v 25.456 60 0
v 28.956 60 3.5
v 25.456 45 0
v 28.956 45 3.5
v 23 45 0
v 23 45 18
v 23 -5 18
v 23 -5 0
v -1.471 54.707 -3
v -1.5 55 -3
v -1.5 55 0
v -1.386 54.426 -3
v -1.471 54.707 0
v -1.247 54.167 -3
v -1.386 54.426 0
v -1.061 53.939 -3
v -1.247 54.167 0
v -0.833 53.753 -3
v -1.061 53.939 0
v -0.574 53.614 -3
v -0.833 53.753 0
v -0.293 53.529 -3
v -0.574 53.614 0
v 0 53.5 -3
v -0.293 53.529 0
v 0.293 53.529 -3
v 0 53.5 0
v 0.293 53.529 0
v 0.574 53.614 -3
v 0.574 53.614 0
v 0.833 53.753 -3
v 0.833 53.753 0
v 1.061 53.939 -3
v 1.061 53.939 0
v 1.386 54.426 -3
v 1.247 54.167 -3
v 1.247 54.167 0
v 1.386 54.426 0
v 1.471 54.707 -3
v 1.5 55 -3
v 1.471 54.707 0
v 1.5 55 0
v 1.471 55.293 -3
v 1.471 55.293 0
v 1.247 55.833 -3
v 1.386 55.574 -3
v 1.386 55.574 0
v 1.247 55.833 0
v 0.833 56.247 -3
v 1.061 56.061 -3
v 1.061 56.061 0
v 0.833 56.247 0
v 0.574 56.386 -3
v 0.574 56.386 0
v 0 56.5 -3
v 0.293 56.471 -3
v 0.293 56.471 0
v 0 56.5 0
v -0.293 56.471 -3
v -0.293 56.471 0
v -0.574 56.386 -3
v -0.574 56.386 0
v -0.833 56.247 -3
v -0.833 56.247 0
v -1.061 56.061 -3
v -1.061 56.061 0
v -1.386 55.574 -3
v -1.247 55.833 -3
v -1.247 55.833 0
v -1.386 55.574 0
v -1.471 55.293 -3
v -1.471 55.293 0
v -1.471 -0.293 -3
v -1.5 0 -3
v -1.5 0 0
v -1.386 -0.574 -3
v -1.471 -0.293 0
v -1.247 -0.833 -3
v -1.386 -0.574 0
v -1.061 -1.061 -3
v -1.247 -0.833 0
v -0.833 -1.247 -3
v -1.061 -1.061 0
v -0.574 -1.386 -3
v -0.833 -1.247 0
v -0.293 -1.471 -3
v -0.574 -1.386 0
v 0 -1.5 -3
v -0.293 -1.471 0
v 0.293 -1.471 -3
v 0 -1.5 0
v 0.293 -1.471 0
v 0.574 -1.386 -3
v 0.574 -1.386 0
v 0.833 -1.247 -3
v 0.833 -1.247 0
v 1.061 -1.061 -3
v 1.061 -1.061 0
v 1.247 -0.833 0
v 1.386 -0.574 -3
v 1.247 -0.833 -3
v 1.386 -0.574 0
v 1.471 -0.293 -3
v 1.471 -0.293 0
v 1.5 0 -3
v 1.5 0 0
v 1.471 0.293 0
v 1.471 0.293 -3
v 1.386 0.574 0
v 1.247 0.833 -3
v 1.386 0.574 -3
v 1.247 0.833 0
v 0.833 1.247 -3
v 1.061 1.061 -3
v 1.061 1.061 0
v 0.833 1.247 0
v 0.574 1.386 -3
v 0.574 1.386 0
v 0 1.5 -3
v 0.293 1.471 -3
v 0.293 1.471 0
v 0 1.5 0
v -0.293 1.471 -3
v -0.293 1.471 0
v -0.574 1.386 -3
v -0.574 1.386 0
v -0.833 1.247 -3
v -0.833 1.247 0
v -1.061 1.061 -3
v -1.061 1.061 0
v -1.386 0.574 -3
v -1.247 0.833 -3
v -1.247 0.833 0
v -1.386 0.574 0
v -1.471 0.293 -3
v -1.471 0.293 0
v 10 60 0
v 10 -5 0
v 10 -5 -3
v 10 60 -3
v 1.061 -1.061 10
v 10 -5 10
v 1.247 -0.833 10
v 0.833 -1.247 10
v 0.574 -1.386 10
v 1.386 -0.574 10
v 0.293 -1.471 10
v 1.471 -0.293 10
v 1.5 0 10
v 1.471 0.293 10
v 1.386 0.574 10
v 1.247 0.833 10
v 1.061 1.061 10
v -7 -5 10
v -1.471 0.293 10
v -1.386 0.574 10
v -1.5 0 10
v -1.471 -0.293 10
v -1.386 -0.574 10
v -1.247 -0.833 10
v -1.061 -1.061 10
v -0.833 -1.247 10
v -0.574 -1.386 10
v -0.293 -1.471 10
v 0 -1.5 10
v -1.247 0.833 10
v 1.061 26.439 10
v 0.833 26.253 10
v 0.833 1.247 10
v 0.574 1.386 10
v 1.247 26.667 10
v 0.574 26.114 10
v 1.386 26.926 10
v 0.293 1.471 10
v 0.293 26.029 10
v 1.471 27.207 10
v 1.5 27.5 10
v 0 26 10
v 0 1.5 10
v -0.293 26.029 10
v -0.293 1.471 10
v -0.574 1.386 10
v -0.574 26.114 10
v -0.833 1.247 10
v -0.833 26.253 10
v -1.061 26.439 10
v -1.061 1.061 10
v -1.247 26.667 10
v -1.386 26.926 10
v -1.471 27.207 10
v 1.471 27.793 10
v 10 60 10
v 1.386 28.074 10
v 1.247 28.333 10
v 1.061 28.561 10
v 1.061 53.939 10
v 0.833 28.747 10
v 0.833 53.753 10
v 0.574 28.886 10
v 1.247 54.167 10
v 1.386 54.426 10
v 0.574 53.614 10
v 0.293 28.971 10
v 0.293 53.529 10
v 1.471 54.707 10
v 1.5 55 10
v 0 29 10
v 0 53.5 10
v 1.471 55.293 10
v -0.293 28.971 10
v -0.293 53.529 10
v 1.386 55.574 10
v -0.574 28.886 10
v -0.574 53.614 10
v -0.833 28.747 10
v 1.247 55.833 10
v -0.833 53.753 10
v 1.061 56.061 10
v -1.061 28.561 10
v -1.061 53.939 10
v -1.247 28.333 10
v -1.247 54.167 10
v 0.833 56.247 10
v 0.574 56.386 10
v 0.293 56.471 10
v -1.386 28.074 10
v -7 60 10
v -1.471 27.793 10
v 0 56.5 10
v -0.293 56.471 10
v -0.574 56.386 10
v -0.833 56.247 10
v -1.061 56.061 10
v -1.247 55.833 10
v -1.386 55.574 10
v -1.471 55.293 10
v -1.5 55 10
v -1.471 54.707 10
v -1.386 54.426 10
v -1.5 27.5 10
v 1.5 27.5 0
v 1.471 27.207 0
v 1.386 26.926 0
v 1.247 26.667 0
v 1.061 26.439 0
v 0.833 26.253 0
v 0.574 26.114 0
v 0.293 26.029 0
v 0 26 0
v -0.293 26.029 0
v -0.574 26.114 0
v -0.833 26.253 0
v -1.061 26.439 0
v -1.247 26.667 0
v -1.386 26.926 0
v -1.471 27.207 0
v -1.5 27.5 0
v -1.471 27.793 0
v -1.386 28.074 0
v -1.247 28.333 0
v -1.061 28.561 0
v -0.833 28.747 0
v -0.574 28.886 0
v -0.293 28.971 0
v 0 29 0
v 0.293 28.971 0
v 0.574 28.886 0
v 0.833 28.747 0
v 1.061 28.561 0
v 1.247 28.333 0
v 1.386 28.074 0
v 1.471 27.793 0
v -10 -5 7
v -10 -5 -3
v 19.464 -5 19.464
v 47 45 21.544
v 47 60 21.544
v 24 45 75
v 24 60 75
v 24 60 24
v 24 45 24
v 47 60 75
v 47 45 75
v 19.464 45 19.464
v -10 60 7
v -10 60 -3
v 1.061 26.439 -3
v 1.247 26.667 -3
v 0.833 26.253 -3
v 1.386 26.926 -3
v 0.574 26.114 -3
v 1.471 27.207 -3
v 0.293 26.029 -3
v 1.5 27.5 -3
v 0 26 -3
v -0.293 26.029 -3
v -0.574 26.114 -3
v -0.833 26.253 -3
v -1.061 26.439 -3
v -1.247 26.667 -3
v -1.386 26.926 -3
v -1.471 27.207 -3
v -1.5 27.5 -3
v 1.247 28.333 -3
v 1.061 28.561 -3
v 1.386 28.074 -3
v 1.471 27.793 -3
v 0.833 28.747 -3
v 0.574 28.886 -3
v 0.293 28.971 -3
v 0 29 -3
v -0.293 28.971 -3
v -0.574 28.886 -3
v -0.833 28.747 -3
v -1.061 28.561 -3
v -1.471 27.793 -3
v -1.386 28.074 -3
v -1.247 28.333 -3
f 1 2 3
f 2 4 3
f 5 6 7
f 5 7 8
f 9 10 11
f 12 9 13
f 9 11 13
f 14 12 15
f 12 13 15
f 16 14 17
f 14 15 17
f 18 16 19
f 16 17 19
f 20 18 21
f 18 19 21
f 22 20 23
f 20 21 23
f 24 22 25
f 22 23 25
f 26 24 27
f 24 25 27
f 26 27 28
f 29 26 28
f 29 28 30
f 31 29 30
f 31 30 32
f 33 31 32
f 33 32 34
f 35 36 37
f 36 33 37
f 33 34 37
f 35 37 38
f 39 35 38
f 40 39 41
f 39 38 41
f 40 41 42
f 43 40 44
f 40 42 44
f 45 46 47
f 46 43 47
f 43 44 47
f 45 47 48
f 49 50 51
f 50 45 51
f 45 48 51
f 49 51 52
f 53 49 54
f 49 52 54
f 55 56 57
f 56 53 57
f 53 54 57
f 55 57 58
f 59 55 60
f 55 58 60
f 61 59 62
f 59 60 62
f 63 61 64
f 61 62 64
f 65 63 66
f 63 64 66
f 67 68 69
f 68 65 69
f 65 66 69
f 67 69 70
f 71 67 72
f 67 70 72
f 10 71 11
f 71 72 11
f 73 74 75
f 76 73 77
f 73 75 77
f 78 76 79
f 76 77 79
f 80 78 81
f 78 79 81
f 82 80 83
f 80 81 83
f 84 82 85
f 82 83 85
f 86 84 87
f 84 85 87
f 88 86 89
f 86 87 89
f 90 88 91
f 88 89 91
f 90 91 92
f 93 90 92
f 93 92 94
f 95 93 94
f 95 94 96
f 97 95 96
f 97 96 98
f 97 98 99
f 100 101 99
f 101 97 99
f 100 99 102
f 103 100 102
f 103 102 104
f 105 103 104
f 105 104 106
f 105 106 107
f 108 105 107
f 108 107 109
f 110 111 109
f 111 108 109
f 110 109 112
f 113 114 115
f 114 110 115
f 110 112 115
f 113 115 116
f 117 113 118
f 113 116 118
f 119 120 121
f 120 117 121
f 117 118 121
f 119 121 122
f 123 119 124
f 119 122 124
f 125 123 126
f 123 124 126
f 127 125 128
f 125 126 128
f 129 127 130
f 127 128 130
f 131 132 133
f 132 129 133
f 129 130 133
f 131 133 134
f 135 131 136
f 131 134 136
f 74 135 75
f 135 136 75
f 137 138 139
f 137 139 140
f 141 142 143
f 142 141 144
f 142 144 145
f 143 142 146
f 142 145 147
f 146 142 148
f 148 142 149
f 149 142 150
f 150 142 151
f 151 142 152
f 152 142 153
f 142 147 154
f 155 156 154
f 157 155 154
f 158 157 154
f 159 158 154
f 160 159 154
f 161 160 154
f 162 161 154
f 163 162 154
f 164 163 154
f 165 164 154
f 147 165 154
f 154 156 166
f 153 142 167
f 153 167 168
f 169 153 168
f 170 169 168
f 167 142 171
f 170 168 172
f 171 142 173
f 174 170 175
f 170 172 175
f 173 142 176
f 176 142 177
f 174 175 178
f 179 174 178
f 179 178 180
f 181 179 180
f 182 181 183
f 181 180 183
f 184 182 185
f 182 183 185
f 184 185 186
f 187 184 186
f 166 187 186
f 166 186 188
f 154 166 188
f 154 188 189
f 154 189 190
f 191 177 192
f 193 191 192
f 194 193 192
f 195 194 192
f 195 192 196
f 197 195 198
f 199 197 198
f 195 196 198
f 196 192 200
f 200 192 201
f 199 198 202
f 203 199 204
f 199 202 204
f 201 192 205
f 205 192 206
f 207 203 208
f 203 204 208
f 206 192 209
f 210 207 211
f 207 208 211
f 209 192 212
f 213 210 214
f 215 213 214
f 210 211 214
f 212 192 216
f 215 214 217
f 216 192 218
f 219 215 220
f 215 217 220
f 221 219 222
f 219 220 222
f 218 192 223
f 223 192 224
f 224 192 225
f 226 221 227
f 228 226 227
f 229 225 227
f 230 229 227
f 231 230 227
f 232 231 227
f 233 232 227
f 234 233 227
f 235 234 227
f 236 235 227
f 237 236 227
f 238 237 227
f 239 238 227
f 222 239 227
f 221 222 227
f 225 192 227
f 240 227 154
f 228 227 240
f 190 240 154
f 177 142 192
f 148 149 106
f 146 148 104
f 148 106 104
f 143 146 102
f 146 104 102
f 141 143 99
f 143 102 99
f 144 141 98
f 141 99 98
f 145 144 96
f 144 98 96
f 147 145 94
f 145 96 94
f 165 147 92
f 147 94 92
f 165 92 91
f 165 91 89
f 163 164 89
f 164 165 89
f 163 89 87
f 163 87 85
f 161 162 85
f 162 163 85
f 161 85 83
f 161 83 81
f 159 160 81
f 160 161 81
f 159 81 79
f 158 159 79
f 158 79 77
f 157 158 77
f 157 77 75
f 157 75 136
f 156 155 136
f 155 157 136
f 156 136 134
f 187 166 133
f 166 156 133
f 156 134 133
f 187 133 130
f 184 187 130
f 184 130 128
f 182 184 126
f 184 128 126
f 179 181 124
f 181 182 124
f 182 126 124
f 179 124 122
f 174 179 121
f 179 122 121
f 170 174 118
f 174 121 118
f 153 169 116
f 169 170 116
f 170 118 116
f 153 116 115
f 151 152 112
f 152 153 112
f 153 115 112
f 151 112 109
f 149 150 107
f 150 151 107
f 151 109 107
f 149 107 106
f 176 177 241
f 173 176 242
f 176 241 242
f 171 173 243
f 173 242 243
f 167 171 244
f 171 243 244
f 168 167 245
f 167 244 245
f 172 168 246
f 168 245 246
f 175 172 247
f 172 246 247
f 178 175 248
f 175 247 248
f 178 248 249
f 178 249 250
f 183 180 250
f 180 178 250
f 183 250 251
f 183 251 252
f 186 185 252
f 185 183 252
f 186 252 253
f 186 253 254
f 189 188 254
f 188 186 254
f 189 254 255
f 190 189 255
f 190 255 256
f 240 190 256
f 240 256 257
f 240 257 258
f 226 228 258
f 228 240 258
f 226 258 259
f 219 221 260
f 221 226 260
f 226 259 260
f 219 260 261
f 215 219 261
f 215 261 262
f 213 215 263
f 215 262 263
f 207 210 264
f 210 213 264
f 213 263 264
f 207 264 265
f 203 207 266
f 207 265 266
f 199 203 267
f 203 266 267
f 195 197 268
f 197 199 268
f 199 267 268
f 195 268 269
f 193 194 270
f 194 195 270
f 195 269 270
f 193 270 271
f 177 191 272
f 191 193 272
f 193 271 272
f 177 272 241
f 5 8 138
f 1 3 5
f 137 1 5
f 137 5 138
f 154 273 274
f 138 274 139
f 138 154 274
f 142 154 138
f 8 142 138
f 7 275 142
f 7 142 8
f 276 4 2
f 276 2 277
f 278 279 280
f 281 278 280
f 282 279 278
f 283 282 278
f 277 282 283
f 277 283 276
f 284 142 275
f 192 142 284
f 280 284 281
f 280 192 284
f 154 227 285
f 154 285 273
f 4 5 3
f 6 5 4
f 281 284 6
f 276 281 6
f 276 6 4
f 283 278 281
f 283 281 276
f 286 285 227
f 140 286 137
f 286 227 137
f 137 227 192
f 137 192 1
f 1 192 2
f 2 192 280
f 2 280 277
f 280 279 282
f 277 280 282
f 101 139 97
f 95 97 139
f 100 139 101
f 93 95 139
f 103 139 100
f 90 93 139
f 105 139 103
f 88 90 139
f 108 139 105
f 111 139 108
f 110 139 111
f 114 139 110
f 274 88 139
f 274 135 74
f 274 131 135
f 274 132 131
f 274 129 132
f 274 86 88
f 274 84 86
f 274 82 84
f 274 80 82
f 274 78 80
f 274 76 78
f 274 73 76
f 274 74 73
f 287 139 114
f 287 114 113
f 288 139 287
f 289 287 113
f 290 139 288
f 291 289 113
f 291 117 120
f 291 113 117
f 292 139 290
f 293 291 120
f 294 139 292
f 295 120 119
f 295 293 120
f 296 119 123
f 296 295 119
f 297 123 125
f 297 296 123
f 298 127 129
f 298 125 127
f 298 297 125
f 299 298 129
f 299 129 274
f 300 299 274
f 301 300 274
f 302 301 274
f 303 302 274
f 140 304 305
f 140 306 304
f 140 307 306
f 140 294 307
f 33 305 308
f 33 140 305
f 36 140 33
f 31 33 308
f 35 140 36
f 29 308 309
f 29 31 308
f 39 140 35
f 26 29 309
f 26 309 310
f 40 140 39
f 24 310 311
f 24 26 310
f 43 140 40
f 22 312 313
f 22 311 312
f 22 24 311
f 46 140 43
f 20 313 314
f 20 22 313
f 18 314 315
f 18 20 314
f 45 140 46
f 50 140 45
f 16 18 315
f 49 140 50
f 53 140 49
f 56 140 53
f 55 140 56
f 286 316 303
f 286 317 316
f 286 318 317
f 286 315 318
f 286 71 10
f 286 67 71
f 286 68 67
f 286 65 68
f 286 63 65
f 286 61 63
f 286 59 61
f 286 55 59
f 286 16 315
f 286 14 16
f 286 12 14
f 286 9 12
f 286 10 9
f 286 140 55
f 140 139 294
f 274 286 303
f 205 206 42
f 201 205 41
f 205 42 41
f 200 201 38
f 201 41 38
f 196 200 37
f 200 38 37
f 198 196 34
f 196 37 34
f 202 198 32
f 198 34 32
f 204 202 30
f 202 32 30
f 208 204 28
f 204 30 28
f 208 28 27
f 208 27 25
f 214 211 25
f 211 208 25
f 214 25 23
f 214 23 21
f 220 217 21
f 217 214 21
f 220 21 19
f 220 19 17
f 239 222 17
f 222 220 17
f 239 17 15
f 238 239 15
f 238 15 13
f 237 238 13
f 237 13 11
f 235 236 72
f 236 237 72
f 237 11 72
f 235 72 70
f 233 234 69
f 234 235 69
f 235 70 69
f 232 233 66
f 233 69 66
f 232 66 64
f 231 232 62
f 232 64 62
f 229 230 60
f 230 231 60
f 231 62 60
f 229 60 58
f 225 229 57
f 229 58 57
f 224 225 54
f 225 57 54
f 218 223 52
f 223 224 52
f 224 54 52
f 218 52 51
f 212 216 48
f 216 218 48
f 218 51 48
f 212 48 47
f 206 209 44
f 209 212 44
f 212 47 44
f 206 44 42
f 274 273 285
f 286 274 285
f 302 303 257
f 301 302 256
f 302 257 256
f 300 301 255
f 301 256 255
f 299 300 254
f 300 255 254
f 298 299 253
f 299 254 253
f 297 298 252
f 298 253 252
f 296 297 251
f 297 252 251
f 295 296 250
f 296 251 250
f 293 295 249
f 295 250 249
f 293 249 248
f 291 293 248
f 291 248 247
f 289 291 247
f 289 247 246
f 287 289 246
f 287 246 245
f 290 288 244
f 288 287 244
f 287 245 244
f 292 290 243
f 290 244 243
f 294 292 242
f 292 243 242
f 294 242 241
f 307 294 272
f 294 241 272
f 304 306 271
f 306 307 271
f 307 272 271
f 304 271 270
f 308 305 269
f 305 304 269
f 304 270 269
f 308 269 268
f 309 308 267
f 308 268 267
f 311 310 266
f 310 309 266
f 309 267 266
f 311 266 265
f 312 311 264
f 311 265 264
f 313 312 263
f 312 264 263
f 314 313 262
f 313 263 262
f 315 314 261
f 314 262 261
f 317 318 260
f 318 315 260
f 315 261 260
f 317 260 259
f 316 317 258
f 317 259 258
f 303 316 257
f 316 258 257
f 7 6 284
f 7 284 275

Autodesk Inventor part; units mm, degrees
ref_plane "YZ Plane" through (0, 0, 0) normal (1, 0, 0) x (0, 1, 0)
ref_plane "XZ Plane" through (0, 0, 0) normal (0, 1, 0) x (-1, 0, 0)
ref_plane "XY Plane" through (0, 0, 0) normal (0, 0, 1) x (1, 0, 0)
sketch "Sketch9" plane through (0, 0, 0) normal (0, 0, 1) x (1, 0, 0)
  line L0 (0, 0) -> (0, 55) construction
  circle A0 centre (0, 55) radius 1.5
  circle A1 centre (0, 0) radius 1.5
  circle A2 centre (0, 27.5) radius 1.5
  line L1 (-10, 60) -> (10, 60)
  line L2 (10, 60) -> (10, -5)
  line L3 (10, -5) -> (-10, -5)
  line L4 (-10, -5) -> (-10, 60)
  point P0 (-10, 27.5)
  point P1 (0, 60)
  dimension "d35" = 55
  dimension "d36" = 3
  dimension "d37" = 3
  dimension "d38" = 3
  dimension "d39" = 5
  dimension "d40" = 10
extrude "Extrusion9" add sketch "Sketch9" along normal blind 10
sketch "Sketch11" plane through (10, -5, 0) normal (1, 0, 0) x (0, 0, -1)
  line L0 (0, 65) -> (-10, 65) projected
  line L1 (0, 65) -> (-75, 65)
  line L2 (-75, 65) -> (-75, 50)
  line L3 (-75, 50) -> (0, 50)
  line L4 (0, 50) -> (0, 65)
  point P0 (0, 5)
  dimension "d43" = 15
  dimension "d44" = 75
extrude "Extrusion10" add sketch "Sketch11" along normal blind 37
sketch "Sketch12" plane through (-10, 60, 10) normal (0, 1, 0) x (1, 0, 0)
  line L0 (20, -65) -> (20, 0) projected
  line L1 (20, -65) -> (34, -65)
  line L2 (34, -65) -> (34, 0)
  line L3 (34, 0) -> (20, 0)
  line L4 (20, 0) -> (20, -65)
  point P0 (10, 10)
  dimension "d47" = 14
extrude "Extrusion11" cut sketch "Sketch12" against normal through all
chamfer "Chamfer6" distance 14 angle 45 1 edges at (24, 52.5, 10)
sketch "Sketch14" plane through (10, 45, 0) normal (0, -1, 0) x (1, 0, 0)
  line L0 (0, 10) -> (14, 24) projected
  line L1 (15.4558, 0) -> (37, 21.5442)
  line L2 (37, 75) -> (37, 0) projected
  line L3 (0, 0) -> (37, 0) projected
  line L4 (15.4558, 0) -> (37, 0)
  line L5 (37, 21.5442) -> (37, 0)
  point P0 (-10, 0)
  dimension "d73" = 18
extrude "Extrusion13" cut sketch "Sketch14" against normal through all
sketch "Sketch15" plane through (0, 0, 0) normal (0, 0, -1) x (-1, 0, 0)
  line L0 (-25.4558, 60) -> (-25.4558, 45) projected
  line L1 (-10, 45) -> (-25.4558, 45) projected
  line L2 (-10, 45) -> (-10, -5) projected
  line L3 (-10, -5) -> (10, -5) projected
  line L4 (10, -5) -> (10, 60) projected
  line L5 (10, 60) -> (-25.4558, 60) projected
  circle A0 centre (0, 55) radius 1.5 projected
  circle A1 centre (0, 0) radius 1.5 projected
  circle A2 centre (0, 27.5) radius 1.5 projected
  line L6 (-10, -5) -> (10, -5) projected
  line L7 (10, 60) -> (-10, 60) projected
  line L8 (-10, -5) -> (-10, 60)
  line L9 (-10, 60) -> (10, 60)
extrude "Extrusion14" add sketch "Sketch15" along normal blind 3 contours L5 L4 L3 L2 L8
chamfer "Chamfer8" distance 3 angle 45 1 edges at (-10, 27.5, 10)
sketch "Sketch17" plane through (-10, -5, -3) normal (0, -1, 0) x (1, 0, 0)
  line L0 (20, 3) -> (20, 13) projected
  line L1 (20, 3) -> (35.4558, 3) projected
  line L2 (20, 3) -> (35.4558, 3)
  line L3 (35.4558, 3) -> (37.5981, 4.5)
  line L4 (37.5981, 4.5) -> (51, 4.5)
  line L5 (51, 6.5) -> (36.9675, 6.5)
  line L6 (36.9675, 6.5) -> (34.8252, 5)
  line L7 (34.8252, 5) -> (20, 5)
  line L8 (20, 3) -> (20, 5)
  line L9 (51, 6.5) -> (51, 4.5)
  point P0 (10, 3)
  point P1 (57, 24.5442)
  dimension "d83" = 215
  dimension "d84" = 2
  dimension "d88" = 1.5
  dimension "d89" = 6
extrude "Extrusion16" add sketch "Sketch17" against normal blind 65
sketch "Sketch18" plane through (24, 60, 75) normal (0, 1, 0) x (1, 0, 0)
  line L0 (17, 73.5) -> (3.5981, 73.5) projected
  line L1 (4.9558, 71.5) -> (17, 71.5) projected
  line L2 (17, 71.5) -> (17, 73.5) projected
  line L3 (3.5981, 73.5) -> (4.9558, 71.5)
  point P0 (-24, 75)
extrude "Extrusion17" cut sketch "Sketch18" against normal through all
sketch "Sketch19" plane through (-10, -5, -3) normal (0, -1, 0) x (1, 0, 0)
  line L0 (34.8252, 5) -> (20, 5) projected
  line L1 (20, 3) -> (35.4558, 3) projected
  line L2 (35.4558, 3) -> (37.5981, 4.5) projected
  line L3 (37.5981, 4.5) -> (38.9558, 6.5) projected
  line L4 (38.9558, 6.5) -> (36.9675, 6.5) projected
  line L5 (36.9675, 6.5) -> (34.8252, 5) projected
  line L6 (20, 3) -> (20, 5)
  point P0 (10, 3)
extrude "Extrusion18" cut sketch "Sketch19" against normal blind 50
sketch "Sketch20" plane through (24, 45, 75) normal (0, -1, 0) x (1, 0, 0)
  line L0 (0, 0) -> (0, -51) projected
  line L1 (-14, -65) -> (0, -51) projected
  line L2 (1.4558, -75) -> (-14, -75) projected
  line L3 (-14, -65) -> (-14, -78) projected
  line L4 (-1, -52) -> (-1, -75)
  line L5 (-14, -75) -> (-1, -75)
  line L6 (-14, -75) -> (-14, -65)
  line L7 (-14, -65) -> (-1, -52)
  line L8 (0, -51) -> (-14, -65) projected
  point P0 (-24, -75)
  dimension "d94" = 1
extrude "Extrusion19" add sketch "Sketch20" along normal blind 50
chamfer "Chamfer9" distance 5 angle 45 1 edges at (23, 20, 23)
sketch "Sketch21" plane through (24, 45, 75) normal (0, -1, 0) x (1, 0, 0)
  line L0 (-1, -57) -> (-1, -75) construction
  line L1 (1.4558, -75) -> (-1, -75) projected
  line L2 (3.5981, -73.5) -> (1.4558, -75) projected
  line L3 (4.9558, -71.5) -> (3.5981, -73.5) projected
  line L4 (4.9558, -71.5) -> (23, -53.4558) projected
  line L5 (23, 0) -> (23, -53.4558) projected
  line L6 (0, 0) -> (23, 0) projected
  line L7 (0, 0) -> (0, -51) projected
  line L8 (-4.5355, -55.5355) -> (0, -51) projected
  line L9 (-1, -57) -> (-4.5355, -55.5355) projected
  line L10 (4.9558, -71.5) -> (23, -53.4558) projected
  line L11 (4.9558, -71.5) -> (1.4558, -75)
  line L12 (1.4558, -75) -> (-1, -75) projected
  point P0 (-24, -75)
extrude "Extrusion20" cut sketch "Sketch21" against normal through all
equation "\"Module\" = 2"
equation "\"PressureAngle\" = 20deg"
equation "\"UnitProfileClearance\" = 0.25"
equation "\"UnitRoundRadius\" = 0.35"
equation "\"HeadDiameter\" = 42"
equation "\"RootDiameter\" = 33"
equation "\"BaseDiameter\" = 35.70832"
equation "\"PitchDiameter\" = 38"
equation "\"HelixAngle\" = 0"
equation "\"UnitCorrection\" = 0"
equation "\"UnitAddendumModification\" = 0"
equation "\"CircularPitch\" = 6.283185"
equation "\"UnitBacklashShift\" = 0"
equation "\"TotalToolShift\" = 0"
equation "\"IsInternal\" = 0"
properties part number "GA04" material "ABS Plastic"
